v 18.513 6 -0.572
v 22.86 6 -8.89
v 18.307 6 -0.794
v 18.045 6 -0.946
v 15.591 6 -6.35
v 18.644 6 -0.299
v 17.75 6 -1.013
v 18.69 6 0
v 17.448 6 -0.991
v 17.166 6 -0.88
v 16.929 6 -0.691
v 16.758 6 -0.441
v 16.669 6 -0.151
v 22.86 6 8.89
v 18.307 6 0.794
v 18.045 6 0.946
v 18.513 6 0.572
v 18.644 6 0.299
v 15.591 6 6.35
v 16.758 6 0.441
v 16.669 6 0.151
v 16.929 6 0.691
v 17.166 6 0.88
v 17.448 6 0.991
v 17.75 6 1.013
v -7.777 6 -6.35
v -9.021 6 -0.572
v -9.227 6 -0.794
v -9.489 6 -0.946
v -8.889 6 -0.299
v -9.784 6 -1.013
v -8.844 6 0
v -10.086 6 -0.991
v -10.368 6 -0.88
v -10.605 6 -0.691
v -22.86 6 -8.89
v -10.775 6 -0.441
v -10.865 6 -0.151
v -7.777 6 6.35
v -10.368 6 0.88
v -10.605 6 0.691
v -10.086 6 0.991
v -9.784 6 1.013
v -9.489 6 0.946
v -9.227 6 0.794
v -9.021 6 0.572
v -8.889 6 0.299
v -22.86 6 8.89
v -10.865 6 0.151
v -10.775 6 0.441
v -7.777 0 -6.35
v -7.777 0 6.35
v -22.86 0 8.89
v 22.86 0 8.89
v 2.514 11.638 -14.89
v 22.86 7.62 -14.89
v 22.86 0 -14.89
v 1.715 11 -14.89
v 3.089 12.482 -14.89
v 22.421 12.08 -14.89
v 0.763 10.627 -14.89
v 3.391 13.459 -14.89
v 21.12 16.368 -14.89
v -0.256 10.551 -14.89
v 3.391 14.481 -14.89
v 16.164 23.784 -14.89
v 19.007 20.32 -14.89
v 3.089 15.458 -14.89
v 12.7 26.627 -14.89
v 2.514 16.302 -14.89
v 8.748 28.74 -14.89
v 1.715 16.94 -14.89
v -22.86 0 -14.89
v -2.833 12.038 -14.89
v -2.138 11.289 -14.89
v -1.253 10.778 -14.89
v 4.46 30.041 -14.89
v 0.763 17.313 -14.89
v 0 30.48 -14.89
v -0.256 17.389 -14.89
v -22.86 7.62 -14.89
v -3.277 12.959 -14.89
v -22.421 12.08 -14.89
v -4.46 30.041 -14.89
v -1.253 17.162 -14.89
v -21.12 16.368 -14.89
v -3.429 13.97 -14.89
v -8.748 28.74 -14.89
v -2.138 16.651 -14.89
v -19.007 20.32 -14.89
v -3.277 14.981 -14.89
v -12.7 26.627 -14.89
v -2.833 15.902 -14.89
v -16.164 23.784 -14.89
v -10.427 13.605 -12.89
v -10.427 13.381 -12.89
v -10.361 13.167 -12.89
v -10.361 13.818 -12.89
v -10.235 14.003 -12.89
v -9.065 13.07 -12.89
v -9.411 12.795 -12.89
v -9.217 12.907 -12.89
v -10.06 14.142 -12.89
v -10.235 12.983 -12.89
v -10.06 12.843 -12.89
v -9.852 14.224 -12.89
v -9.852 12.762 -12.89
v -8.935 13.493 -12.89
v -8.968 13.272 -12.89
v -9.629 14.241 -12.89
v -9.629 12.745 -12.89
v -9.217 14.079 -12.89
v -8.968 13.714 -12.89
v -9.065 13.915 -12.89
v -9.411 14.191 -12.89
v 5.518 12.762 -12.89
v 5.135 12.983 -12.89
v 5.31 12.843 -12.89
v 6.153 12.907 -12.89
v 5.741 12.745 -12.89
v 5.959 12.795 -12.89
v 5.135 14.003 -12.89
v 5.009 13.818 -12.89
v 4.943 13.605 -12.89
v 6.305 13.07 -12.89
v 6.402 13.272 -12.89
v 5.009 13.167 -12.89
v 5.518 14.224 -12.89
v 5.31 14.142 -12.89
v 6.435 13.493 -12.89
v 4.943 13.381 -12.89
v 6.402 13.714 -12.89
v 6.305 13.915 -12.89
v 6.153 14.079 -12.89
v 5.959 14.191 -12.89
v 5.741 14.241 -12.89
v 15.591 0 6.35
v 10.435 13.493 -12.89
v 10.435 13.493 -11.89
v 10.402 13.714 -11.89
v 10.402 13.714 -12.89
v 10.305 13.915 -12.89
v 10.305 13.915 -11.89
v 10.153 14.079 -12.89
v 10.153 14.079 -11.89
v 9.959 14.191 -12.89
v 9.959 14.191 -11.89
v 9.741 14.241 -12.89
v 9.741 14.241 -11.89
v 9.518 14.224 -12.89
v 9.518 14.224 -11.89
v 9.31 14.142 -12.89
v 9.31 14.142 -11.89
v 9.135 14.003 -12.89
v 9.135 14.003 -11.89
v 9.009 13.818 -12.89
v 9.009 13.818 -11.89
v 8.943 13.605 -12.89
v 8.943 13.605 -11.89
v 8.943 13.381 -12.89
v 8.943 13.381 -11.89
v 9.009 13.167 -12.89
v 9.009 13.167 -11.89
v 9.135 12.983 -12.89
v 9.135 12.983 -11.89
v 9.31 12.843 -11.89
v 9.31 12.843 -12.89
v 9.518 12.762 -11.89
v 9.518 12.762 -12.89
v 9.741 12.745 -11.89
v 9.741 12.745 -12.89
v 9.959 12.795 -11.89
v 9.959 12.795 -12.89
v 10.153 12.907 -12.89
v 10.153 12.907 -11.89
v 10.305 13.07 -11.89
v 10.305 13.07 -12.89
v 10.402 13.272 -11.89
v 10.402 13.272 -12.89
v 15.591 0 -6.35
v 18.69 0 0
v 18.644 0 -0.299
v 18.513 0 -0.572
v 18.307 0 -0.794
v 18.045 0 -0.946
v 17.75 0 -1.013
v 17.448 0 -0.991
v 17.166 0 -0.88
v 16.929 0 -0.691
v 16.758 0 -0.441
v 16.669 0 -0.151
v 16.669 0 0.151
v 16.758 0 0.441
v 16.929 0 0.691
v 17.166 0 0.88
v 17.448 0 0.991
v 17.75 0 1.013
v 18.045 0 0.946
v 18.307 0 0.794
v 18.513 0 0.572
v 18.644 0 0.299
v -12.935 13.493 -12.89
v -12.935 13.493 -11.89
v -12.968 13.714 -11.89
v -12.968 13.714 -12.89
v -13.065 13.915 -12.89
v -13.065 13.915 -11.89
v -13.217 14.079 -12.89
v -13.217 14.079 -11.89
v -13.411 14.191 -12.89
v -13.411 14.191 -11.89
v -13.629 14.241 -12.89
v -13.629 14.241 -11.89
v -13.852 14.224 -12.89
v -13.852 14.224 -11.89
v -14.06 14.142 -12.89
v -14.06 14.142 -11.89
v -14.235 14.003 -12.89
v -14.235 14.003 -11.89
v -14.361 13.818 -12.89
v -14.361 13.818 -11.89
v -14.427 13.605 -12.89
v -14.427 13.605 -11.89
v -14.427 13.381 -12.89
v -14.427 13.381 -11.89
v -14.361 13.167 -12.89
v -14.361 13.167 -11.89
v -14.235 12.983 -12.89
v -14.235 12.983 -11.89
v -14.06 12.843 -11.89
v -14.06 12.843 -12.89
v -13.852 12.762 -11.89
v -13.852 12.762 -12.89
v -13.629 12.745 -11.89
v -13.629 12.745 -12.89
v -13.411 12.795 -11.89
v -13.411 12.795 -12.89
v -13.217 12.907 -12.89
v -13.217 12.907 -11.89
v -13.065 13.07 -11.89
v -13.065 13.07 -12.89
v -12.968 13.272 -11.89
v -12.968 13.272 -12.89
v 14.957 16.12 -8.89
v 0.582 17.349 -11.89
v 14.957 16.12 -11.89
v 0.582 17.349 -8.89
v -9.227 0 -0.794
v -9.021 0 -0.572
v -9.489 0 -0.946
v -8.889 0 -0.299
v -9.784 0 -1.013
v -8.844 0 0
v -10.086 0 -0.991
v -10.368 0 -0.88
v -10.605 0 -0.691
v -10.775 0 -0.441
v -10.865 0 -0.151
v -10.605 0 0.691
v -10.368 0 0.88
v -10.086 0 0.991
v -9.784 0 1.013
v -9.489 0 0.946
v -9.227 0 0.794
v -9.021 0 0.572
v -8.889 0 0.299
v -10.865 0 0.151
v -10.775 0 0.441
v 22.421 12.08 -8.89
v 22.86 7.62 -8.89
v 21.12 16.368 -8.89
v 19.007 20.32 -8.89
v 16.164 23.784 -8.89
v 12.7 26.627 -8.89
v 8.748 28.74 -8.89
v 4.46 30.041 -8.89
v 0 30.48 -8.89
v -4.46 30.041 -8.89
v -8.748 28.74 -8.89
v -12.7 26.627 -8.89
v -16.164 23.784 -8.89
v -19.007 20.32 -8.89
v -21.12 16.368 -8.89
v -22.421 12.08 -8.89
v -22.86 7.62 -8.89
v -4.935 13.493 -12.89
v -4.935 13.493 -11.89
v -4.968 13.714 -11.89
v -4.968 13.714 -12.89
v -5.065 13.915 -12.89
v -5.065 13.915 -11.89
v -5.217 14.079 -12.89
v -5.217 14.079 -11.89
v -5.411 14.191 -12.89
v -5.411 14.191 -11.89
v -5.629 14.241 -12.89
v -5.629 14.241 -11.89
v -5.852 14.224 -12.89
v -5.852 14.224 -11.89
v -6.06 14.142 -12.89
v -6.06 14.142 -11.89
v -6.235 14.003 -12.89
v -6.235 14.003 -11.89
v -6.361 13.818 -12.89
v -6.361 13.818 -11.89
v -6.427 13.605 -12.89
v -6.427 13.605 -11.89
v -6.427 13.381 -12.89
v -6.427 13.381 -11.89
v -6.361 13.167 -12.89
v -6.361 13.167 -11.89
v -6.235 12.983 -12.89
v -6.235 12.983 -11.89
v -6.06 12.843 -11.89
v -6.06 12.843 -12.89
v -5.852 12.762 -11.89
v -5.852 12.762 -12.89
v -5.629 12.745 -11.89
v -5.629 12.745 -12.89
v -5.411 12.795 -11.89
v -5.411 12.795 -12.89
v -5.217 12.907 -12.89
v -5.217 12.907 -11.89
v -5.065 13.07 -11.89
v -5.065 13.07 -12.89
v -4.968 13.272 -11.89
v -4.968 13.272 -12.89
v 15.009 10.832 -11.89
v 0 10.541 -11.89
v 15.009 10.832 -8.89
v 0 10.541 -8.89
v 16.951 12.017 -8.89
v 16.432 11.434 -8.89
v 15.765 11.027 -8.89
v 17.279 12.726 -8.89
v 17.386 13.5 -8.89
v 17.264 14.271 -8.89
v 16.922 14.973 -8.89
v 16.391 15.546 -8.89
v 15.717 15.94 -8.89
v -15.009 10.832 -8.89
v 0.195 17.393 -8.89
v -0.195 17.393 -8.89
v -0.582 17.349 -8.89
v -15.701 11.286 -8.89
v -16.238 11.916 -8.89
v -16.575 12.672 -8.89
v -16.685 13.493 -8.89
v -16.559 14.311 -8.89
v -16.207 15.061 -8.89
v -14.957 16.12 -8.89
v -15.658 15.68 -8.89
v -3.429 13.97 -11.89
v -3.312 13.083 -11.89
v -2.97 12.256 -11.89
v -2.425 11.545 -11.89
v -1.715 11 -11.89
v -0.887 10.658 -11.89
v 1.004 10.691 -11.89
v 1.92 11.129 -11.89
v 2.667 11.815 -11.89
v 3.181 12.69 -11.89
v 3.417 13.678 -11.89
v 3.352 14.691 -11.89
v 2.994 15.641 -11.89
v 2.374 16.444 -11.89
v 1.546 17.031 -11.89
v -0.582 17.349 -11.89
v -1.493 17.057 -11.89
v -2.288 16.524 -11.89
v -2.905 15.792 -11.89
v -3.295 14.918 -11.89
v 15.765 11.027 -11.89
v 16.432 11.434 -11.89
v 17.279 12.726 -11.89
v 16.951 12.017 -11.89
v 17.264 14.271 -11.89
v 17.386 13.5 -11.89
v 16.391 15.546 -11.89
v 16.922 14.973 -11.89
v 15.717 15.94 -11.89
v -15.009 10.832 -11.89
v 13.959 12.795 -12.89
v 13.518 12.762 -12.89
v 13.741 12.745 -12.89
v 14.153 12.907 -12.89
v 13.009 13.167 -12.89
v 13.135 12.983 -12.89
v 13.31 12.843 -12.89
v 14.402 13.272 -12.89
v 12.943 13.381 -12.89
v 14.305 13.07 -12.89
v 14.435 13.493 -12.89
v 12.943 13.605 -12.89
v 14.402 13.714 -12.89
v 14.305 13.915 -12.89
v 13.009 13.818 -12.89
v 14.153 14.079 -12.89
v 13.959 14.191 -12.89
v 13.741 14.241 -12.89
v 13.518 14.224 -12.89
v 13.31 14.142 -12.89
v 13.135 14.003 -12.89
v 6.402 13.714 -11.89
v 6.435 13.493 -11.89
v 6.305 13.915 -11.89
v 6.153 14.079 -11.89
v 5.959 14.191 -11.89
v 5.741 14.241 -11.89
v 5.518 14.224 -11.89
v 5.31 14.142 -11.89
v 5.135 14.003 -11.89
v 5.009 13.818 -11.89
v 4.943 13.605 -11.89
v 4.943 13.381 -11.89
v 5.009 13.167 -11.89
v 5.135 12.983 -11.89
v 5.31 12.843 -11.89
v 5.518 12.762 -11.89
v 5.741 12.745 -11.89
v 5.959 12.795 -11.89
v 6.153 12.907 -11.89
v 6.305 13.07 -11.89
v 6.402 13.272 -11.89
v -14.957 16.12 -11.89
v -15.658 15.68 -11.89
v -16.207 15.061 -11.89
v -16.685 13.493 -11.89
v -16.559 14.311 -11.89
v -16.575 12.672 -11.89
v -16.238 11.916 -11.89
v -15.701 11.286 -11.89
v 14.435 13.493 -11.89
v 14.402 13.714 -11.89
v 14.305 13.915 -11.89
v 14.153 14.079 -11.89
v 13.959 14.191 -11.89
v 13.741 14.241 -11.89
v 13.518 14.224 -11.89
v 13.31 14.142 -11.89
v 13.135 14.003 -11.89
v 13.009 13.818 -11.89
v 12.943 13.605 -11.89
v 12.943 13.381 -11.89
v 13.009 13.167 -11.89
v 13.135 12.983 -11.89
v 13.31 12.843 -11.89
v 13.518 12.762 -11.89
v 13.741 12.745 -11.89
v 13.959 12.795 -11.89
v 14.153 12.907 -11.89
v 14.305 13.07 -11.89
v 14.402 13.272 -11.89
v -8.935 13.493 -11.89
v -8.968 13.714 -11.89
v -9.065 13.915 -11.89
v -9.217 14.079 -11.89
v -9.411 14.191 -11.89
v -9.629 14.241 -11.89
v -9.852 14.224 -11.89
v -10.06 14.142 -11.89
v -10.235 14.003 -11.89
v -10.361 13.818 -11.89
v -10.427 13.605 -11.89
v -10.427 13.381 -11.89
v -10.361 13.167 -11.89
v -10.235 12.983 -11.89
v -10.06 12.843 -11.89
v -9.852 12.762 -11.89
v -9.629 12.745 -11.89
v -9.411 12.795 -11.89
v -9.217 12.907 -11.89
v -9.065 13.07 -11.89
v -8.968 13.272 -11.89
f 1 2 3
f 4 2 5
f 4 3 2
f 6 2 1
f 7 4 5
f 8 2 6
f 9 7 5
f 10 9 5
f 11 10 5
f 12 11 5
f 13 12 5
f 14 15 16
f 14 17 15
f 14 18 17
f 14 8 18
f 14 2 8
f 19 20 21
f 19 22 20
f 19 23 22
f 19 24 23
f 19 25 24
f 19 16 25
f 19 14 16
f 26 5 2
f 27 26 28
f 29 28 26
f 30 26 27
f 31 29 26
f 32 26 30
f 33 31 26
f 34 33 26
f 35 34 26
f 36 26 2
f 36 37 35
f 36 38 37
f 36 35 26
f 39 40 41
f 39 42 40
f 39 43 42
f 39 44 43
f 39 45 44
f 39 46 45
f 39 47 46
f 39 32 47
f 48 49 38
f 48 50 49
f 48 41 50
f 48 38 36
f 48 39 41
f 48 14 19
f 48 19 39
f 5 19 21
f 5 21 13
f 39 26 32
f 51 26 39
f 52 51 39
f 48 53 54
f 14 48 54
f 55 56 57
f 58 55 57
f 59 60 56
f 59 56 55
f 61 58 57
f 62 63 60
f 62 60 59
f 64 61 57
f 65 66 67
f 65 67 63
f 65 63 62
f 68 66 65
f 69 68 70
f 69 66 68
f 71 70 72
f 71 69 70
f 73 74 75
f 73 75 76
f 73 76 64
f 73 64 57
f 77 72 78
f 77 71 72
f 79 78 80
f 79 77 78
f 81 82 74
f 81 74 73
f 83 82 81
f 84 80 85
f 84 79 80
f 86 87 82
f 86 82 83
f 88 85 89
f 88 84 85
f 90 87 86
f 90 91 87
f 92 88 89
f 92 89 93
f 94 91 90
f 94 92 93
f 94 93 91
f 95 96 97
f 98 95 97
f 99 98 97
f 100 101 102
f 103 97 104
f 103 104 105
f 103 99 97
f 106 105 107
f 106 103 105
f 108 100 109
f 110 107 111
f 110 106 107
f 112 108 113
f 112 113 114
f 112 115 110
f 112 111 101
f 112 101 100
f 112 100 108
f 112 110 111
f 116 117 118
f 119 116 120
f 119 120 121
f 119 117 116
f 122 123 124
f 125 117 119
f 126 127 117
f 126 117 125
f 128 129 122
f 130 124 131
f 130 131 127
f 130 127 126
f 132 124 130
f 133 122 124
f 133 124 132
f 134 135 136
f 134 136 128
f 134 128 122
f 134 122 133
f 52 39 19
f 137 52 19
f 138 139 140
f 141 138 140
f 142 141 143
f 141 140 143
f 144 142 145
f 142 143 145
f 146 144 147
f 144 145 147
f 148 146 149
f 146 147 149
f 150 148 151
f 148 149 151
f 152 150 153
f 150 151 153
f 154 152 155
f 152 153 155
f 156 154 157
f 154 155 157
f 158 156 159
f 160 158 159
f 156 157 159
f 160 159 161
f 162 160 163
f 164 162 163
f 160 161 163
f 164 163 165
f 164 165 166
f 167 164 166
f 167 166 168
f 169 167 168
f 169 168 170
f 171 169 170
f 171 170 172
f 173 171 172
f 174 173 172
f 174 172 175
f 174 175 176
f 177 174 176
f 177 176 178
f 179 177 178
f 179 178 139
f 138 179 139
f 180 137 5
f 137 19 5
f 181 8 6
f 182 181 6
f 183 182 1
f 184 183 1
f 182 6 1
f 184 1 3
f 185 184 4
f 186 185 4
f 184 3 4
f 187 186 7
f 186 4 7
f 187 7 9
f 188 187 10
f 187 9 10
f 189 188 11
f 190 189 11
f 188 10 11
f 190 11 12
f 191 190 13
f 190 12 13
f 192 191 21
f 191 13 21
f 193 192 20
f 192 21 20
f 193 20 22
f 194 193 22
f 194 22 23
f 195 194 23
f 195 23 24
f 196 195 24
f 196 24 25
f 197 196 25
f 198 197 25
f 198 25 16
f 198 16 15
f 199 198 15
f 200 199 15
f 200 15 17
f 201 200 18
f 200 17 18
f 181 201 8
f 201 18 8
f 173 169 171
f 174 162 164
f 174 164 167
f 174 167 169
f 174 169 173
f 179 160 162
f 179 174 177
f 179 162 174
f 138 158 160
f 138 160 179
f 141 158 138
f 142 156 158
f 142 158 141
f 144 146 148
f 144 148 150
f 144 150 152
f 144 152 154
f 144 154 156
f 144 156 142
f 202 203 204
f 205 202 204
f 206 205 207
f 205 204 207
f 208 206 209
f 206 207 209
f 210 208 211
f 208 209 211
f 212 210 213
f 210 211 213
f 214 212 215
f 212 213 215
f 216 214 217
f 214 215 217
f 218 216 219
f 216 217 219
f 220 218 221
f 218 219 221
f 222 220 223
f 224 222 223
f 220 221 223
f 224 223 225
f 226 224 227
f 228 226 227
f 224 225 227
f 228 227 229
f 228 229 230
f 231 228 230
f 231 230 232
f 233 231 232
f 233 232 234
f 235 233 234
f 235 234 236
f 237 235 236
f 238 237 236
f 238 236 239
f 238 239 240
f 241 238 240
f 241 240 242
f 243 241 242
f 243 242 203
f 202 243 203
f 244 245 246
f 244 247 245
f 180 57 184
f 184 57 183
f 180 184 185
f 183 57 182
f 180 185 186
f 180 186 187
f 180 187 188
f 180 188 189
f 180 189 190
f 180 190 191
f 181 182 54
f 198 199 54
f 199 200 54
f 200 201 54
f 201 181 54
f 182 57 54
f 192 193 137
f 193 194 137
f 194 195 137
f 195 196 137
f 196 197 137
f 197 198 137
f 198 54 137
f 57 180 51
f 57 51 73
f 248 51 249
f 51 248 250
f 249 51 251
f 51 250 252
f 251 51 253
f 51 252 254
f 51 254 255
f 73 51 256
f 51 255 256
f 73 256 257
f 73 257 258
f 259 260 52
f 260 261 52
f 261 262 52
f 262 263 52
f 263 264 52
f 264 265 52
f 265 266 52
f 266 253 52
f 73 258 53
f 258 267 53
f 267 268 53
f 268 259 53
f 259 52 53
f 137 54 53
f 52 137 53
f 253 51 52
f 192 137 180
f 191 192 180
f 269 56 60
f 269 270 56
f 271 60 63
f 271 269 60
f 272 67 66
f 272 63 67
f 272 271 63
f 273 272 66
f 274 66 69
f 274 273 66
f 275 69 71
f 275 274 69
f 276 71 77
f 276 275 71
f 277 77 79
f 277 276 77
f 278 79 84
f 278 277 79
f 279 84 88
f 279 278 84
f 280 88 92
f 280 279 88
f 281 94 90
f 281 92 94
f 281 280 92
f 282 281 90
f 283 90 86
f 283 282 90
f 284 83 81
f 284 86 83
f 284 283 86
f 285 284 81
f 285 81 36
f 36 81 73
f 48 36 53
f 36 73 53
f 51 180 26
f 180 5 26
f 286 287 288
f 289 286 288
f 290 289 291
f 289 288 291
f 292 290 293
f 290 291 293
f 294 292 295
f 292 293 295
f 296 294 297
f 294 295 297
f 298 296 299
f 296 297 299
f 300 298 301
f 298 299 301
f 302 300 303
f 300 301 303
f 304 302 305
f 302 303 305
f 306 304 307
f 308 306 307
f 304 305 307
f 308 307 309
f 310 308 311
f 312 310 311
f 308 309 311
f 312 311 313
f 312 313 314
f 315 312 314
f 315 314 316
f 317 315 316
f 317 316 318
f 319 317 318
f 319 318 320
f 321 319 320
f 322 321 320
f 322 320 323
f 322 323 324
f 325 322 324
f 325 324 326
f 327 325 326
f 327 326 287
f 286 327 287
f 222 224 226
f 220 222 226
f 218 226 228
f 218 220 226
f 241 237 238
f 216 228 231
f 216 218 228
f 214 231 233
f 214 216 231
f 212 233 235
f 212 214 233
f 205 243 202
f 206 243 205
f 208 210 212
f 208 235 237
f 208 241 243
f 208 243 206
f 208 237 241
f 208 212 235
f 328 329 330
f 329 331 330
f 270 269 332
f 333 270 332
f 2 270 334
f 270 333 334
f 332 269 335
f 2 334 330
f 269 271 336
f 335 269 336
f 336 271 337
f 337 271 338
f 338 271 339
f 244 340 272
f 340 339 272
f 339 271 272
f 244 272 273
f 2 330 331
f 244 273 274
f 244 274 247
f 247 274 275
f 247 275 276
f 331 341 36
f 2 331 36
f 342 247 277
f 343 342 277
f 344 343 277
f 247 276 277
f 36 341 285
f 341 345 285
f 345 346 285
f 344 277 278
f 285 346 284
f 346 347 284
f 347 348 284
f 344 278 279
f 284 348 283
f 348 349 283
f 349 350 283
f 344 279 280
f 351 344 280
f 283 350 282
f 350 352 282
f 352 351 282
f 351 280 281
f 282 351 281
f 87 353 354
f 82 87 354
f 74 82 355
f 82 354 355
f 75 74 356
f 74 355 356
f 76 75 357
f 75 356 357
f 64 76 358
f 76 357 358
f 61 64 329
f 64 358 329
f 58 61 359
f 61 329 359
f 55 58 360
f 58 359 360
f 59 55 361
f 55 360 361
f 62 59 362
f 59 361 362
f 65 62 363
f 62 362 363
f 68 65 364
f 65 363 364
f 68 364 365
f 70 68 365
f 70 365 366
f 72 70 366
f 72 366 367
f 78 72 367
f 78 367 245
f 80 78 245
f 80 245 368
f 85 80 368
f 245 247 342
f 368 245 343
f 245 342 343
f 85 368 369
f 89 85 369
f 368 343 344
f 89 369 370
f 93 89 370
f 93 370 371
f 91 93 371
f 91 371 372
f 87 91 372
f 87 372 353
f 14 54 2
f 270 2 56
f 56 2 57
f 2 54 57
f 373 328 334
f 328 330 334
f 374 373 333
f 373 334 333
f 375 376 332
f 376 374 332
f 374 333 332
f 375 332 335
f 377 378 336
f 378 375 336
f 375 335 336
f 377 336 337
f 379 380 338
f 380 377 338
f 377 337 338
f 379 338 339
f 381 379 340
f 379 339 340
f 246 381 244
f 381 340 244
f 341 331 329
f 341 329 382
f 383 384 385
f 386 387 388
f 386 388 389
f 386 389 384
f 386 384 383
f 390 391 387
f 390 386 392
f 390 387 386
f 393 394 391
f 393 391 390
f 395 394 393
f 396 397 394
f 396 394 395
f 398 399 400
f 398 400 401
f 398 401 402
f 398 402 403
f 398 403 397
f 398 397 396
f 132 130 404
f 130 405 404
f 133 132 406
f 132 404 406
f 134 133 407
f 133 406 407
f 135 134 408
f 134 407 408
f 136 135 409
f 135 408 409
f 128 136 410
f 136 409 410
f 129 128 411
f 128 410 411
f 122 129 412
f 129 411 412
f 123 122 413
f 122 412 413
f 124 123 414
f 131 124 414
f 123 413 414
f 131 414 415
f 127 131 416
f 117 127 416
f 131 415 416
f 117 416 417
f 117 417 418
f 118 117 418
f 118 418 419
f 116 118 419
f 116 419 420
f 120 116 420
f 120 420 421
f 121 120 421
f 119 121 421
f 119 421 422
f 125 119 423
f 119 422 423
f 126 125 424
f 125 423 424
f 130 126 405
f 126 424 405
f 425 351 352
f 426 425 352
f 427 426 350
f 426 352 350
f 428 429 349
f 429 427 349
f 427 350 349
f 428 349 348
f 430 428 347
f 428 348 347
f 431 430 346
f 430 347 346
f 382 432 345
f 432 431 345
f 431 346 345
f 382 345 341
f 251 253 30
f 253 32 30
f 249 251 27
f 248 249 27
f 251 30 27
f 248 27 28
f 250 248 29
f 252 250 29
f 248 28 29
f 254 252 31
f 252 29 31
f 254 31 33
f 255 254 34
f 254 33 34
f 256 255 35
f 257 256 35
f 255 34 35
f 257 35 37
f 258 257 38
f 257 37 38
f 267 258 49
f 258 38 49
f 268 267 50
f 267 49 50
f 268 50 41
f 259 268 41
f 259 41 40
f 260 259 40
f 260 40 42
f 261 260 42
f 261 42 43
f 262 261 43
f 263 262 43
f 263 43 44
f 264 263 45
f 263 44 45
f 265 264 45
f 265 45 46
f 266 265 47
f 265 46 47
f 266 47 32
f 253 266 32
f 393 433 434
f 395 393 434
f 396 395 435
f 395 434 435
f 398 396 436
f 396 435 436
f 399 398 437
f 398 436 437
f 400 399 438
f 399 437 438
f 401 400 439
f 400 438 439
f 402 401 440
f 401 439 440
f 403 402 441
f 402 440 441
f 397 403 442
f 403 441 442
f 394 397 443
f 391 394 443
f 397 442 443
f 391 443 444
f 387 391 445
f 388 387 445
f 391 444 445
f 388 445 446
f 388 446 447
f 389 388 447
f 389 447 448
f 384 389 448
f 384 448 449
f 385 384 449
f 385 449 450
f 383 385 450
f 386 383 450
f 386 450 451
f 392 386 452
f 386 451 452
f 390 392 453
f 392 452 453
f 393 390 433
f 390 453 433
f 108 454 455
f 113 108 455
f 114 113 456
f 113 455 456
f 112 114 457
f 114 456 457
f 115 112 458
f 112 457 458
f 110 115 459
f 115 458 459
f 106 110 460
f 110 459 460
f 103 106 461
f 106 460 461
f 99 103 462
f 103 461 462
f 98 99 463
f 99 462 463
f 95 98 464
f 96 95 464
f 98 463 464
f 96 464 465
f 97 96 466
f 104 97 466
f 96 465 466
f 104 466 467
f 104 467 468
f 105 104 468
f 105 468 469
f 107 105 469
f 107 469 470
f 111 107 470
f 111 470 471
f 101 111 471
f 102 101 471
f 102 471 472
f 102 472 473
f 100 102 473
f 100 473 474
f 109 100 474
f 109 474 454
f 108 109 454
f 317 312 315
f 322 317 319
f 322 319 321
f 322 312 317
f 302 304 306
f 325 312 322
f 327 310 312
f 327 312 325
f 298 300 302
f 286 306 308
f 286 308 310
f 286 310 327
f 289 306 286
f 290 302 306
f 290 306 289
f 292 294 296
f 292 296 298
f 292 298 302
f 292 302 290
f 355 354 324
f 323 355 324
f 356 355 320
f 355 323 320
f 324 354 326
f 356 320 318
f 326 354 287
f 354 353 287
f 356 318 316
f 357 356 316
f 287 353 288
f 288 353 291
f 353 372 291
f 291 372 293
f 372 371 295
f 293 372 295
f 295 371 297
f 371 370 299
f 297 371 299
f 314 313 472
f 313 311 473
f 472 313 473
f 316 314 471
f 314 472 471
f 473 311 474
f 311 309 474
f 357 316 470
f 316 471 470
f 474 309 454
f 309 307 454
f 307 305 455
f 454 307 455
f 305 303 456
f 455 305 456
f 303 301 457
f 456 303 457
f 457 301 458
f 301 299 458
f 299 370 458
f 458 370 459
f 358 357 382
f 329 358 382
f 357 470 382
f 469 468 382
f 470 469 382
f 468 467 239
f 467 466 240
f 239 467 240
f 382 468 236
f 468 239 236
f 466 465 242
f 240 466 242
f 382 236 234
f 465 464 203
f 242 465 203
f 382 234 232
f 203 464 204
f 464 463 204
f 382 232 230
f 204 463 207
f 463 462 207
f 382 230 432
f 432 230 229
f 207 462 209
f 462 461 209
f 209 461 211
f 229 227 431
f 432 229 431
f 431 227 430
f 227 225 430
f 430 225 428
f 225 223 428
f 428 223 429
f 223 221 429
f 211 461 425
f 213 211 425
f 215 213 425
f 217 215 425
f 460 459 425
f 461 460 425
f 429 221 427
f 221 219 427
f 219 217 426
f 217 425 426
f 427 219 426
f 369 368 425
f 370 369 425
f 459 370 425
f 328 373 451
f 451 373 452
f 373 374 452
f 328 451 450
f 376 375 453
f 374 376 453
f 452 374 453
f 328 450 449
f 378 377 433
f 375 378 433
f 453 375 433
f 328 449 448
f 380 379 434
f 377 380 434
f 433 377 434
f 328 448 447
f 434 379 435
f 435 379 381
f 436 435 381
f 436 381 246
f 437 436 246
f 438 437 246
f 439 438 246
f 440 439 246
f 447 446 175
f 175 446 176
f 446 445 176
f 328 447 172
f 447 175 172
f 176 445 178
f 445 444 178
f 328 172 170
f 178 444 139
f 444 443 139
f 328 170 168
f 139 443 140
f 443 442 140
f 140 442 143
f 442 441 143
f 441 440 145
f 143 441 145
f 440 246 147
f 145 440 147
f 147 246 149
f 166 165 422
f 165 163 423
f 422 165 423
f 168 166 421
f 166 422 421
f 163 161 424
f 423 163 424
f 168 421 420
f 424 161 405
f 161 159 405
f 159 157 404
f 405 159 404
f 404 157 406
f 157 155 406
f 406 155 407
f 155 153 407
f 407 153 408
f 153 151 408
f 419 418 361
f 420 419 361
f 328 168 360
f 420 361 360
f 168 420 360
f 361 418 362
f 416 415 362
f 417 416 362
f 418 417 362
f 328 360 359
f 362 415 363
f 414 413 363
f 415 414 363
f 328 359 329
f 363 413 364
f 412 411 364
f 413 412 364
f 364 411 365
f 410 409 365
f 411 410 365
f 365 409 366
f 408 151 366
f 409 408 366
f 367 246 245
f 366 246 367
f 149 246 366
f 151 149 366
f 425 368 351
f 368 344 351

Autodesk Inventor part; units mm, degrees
ref_plane "YZ Plane" through (0, 0, 0) normal (1, 0, 0) x (0, 1, 0)
ref_plane "XZ Plane" through (0, 0, 0) normal (0, 1, 0) x (-1, 0, 0)
ref_plane "XY Plane" through (0, 0, 0) normal (0, 0, 1) x (1, 0, 0)
sketch "Sketch1" plane through (0, 0, 0) normal (0, 1, 0) x (-1, 0, 0)
  line L0 (22.86, 8.89) -> (-22.86, 8.89)
  line L1 (-22.86, 8.89) -> (-22.86, -8.89)
  line L2 (-22.86, -8.89) -> (22.86, -8.89)
  line L3 (22.86, -8.89) -> (22.86, 8.89)
  point P0 (0, 0)
  point P1 (0, -8.89)
  point P2 (22.86, 0)
  dimension "d0" = 45.72
  dimension "d1" = 17.78
extrude "Extrusion1" add sketch "Sketch1" along normal blind 6
sketch "Sketch2" plane through (0, 6, 0) normal (0, 1, 0) x (1, 0, 0)
  line L0 (-7.7772, -6.35) -> (15.5908, -6.35)
  line L1 (15.5908, -6.35) -> (15.5908, 6.35)
  line L2 (15.5908, 6.35) -> (-7.7772, 6.35)
  line L3 (-7.7772, 6.35) -> (-7.7772, -6.35)
  circle A0 centre (-9.86, 0) radius 1.016
  circle A1 centre (17.6736, 0) radius 1.016
  line L4 (-22.86, 8.89) -> (-22.86, -8.89) projected
  line L5 (22.86, 8.89) -> (-22.86, 8.89) projected
  point P0 (3.9068, 0)
  point P1 (-7.7772, 0)
  point P2 (3.9068, 6.35)
  dimension "d4" = 23.368
  dimension "d5" = 12.7
  dimension "d6" = 2.032
  dimension "d7" = 2.032
  dimension "d8" = 2.0828
  dimension "d9" = 2.0828
  dimension "d34" = 13
  dimension "d35" = 2.54
extrude "Extrusion2" cut sketch "Sketch2" against normal blind 15
sketch "Sketch3" plane through (22.86, 0, -8.89) normal (0, 0, -1) x (-1, 0, 0)
  line L0 (0, 0) -> (45.72, 0) projected
  circle A0 centre (22.86, 13.97) radius 3.429
  line L1 (22.86, 17.399) -> (7.9031, 16.12)
  line L2 (22.86, 10.541) -> (7.8514, 10.8324)
  arc A1 (7.9031, 16.12) -> (7.8514, 10.8324) centre (8.1294, 13.4738) ccw
  arc A2 (37.8686, 10.8324) -> (37.8169, 16.12) centre (36.641, 13.4645) ccw
  line L3 (22.86, 17.399) -> (37.8169, 16.12)
  line L4 (22.86, 10.541) -> (37.8686, 10.8324)
  line L5 (45.72, 0) -> (45.72, 6) projected
  line L6 (45.72, 0) -> (45.72, 7.62)
  line L7 (0, 0) -> (0, 7.62)
  arc A3 (45.72, 7.62) -> (0, 7.62) centre (22.86, 7.62) ccw
  point P0 (22.86, 0)
  point P1 (22.7269, 10.5436)
  point P2 (22.9931, 10.5436)
  point P3 (22.2778, 17.3492)
  point P4 (23.4422, 17.3492)
  point P5 (22.86, 30.48)
  point P6 (39.5451, 13.4929)
  dimension "d14" = 6
  dimension "d15" = 6.858
  dimension "d25" = 7.62
  dimension "d30" = 6
  dimension "d31" = 16.51
  dimension "d33" = 13.781
extrude "Extrusion3" add sketch "Sketch3" along normal blind 3 contours A0 L1 L3 | L2 A1 L1 A0 | A0 L3 A2 L4 | L3 A0
extrude "Extrusion6" add sketch "Sketch3" along normal blind 6 contours L7 A3 L6 L5 L0 | A0 L1 L3 | L2 A1 L1 A0 | A0 L3 A2 L4 | A0 L1 | L3 A0
extrude "Extrusion4" cut sketch "Sketch3" along normal through all contours A0 L1 L3 | A0 L1 | L3 A0
extrude "Extrusion5" cut sketch "Sketch3" along normal blind 3 contours A0 L1 L3 | L2 A1 L1 A0 | A0 L3 A2 L4 | A0 L1 | L3 A0
sketch "Sketch4" plane through (22.86, 0, -8.89) normal (0, 0, 1) x (1, 0, 0)
  line L0 (-22.86, 19.9111) -> (-22.86, 7.8054)
  circle A0 centre (-32.5451, 13.4929) radius 0.75
  circle A1 centre (-36.5451, 13.4929) radius 0.75
  circle A2 centre (-28.5451, 13.4929) radius 0.75
  arc A3 (-37.8169, 16.12) -> (-37.8686, 10.8324) centre (-36.641, 13.4645) ccw projected
  circle A4 centre (-17.1749, 13.4929) radius 0.75
  circle A5 centre (-13.1749, 13.4929) radius 0.75
  circle A6 centre (-9.1749, 13.4929) radius 0.75
  point P0 (-22.86, 0)
  point P1 (-36.7619, 13.4929)
  point P2 (-39.5451, 13.4929)
  point P3 (-39.5451, 13.4929)
  point P4 (-9.079, 13.4645)
  dimension "d54" = 1.5
  dimension "d55" = 1.5
  dimension "d56" = 1.5
  dimension "d57" = 4
  dimension "d58" = 4
  dimension "d59" = 3
extrude "Extrusion7" cut sketch "Sketch4" against normal blind 4
properties part number "unions1s2"
